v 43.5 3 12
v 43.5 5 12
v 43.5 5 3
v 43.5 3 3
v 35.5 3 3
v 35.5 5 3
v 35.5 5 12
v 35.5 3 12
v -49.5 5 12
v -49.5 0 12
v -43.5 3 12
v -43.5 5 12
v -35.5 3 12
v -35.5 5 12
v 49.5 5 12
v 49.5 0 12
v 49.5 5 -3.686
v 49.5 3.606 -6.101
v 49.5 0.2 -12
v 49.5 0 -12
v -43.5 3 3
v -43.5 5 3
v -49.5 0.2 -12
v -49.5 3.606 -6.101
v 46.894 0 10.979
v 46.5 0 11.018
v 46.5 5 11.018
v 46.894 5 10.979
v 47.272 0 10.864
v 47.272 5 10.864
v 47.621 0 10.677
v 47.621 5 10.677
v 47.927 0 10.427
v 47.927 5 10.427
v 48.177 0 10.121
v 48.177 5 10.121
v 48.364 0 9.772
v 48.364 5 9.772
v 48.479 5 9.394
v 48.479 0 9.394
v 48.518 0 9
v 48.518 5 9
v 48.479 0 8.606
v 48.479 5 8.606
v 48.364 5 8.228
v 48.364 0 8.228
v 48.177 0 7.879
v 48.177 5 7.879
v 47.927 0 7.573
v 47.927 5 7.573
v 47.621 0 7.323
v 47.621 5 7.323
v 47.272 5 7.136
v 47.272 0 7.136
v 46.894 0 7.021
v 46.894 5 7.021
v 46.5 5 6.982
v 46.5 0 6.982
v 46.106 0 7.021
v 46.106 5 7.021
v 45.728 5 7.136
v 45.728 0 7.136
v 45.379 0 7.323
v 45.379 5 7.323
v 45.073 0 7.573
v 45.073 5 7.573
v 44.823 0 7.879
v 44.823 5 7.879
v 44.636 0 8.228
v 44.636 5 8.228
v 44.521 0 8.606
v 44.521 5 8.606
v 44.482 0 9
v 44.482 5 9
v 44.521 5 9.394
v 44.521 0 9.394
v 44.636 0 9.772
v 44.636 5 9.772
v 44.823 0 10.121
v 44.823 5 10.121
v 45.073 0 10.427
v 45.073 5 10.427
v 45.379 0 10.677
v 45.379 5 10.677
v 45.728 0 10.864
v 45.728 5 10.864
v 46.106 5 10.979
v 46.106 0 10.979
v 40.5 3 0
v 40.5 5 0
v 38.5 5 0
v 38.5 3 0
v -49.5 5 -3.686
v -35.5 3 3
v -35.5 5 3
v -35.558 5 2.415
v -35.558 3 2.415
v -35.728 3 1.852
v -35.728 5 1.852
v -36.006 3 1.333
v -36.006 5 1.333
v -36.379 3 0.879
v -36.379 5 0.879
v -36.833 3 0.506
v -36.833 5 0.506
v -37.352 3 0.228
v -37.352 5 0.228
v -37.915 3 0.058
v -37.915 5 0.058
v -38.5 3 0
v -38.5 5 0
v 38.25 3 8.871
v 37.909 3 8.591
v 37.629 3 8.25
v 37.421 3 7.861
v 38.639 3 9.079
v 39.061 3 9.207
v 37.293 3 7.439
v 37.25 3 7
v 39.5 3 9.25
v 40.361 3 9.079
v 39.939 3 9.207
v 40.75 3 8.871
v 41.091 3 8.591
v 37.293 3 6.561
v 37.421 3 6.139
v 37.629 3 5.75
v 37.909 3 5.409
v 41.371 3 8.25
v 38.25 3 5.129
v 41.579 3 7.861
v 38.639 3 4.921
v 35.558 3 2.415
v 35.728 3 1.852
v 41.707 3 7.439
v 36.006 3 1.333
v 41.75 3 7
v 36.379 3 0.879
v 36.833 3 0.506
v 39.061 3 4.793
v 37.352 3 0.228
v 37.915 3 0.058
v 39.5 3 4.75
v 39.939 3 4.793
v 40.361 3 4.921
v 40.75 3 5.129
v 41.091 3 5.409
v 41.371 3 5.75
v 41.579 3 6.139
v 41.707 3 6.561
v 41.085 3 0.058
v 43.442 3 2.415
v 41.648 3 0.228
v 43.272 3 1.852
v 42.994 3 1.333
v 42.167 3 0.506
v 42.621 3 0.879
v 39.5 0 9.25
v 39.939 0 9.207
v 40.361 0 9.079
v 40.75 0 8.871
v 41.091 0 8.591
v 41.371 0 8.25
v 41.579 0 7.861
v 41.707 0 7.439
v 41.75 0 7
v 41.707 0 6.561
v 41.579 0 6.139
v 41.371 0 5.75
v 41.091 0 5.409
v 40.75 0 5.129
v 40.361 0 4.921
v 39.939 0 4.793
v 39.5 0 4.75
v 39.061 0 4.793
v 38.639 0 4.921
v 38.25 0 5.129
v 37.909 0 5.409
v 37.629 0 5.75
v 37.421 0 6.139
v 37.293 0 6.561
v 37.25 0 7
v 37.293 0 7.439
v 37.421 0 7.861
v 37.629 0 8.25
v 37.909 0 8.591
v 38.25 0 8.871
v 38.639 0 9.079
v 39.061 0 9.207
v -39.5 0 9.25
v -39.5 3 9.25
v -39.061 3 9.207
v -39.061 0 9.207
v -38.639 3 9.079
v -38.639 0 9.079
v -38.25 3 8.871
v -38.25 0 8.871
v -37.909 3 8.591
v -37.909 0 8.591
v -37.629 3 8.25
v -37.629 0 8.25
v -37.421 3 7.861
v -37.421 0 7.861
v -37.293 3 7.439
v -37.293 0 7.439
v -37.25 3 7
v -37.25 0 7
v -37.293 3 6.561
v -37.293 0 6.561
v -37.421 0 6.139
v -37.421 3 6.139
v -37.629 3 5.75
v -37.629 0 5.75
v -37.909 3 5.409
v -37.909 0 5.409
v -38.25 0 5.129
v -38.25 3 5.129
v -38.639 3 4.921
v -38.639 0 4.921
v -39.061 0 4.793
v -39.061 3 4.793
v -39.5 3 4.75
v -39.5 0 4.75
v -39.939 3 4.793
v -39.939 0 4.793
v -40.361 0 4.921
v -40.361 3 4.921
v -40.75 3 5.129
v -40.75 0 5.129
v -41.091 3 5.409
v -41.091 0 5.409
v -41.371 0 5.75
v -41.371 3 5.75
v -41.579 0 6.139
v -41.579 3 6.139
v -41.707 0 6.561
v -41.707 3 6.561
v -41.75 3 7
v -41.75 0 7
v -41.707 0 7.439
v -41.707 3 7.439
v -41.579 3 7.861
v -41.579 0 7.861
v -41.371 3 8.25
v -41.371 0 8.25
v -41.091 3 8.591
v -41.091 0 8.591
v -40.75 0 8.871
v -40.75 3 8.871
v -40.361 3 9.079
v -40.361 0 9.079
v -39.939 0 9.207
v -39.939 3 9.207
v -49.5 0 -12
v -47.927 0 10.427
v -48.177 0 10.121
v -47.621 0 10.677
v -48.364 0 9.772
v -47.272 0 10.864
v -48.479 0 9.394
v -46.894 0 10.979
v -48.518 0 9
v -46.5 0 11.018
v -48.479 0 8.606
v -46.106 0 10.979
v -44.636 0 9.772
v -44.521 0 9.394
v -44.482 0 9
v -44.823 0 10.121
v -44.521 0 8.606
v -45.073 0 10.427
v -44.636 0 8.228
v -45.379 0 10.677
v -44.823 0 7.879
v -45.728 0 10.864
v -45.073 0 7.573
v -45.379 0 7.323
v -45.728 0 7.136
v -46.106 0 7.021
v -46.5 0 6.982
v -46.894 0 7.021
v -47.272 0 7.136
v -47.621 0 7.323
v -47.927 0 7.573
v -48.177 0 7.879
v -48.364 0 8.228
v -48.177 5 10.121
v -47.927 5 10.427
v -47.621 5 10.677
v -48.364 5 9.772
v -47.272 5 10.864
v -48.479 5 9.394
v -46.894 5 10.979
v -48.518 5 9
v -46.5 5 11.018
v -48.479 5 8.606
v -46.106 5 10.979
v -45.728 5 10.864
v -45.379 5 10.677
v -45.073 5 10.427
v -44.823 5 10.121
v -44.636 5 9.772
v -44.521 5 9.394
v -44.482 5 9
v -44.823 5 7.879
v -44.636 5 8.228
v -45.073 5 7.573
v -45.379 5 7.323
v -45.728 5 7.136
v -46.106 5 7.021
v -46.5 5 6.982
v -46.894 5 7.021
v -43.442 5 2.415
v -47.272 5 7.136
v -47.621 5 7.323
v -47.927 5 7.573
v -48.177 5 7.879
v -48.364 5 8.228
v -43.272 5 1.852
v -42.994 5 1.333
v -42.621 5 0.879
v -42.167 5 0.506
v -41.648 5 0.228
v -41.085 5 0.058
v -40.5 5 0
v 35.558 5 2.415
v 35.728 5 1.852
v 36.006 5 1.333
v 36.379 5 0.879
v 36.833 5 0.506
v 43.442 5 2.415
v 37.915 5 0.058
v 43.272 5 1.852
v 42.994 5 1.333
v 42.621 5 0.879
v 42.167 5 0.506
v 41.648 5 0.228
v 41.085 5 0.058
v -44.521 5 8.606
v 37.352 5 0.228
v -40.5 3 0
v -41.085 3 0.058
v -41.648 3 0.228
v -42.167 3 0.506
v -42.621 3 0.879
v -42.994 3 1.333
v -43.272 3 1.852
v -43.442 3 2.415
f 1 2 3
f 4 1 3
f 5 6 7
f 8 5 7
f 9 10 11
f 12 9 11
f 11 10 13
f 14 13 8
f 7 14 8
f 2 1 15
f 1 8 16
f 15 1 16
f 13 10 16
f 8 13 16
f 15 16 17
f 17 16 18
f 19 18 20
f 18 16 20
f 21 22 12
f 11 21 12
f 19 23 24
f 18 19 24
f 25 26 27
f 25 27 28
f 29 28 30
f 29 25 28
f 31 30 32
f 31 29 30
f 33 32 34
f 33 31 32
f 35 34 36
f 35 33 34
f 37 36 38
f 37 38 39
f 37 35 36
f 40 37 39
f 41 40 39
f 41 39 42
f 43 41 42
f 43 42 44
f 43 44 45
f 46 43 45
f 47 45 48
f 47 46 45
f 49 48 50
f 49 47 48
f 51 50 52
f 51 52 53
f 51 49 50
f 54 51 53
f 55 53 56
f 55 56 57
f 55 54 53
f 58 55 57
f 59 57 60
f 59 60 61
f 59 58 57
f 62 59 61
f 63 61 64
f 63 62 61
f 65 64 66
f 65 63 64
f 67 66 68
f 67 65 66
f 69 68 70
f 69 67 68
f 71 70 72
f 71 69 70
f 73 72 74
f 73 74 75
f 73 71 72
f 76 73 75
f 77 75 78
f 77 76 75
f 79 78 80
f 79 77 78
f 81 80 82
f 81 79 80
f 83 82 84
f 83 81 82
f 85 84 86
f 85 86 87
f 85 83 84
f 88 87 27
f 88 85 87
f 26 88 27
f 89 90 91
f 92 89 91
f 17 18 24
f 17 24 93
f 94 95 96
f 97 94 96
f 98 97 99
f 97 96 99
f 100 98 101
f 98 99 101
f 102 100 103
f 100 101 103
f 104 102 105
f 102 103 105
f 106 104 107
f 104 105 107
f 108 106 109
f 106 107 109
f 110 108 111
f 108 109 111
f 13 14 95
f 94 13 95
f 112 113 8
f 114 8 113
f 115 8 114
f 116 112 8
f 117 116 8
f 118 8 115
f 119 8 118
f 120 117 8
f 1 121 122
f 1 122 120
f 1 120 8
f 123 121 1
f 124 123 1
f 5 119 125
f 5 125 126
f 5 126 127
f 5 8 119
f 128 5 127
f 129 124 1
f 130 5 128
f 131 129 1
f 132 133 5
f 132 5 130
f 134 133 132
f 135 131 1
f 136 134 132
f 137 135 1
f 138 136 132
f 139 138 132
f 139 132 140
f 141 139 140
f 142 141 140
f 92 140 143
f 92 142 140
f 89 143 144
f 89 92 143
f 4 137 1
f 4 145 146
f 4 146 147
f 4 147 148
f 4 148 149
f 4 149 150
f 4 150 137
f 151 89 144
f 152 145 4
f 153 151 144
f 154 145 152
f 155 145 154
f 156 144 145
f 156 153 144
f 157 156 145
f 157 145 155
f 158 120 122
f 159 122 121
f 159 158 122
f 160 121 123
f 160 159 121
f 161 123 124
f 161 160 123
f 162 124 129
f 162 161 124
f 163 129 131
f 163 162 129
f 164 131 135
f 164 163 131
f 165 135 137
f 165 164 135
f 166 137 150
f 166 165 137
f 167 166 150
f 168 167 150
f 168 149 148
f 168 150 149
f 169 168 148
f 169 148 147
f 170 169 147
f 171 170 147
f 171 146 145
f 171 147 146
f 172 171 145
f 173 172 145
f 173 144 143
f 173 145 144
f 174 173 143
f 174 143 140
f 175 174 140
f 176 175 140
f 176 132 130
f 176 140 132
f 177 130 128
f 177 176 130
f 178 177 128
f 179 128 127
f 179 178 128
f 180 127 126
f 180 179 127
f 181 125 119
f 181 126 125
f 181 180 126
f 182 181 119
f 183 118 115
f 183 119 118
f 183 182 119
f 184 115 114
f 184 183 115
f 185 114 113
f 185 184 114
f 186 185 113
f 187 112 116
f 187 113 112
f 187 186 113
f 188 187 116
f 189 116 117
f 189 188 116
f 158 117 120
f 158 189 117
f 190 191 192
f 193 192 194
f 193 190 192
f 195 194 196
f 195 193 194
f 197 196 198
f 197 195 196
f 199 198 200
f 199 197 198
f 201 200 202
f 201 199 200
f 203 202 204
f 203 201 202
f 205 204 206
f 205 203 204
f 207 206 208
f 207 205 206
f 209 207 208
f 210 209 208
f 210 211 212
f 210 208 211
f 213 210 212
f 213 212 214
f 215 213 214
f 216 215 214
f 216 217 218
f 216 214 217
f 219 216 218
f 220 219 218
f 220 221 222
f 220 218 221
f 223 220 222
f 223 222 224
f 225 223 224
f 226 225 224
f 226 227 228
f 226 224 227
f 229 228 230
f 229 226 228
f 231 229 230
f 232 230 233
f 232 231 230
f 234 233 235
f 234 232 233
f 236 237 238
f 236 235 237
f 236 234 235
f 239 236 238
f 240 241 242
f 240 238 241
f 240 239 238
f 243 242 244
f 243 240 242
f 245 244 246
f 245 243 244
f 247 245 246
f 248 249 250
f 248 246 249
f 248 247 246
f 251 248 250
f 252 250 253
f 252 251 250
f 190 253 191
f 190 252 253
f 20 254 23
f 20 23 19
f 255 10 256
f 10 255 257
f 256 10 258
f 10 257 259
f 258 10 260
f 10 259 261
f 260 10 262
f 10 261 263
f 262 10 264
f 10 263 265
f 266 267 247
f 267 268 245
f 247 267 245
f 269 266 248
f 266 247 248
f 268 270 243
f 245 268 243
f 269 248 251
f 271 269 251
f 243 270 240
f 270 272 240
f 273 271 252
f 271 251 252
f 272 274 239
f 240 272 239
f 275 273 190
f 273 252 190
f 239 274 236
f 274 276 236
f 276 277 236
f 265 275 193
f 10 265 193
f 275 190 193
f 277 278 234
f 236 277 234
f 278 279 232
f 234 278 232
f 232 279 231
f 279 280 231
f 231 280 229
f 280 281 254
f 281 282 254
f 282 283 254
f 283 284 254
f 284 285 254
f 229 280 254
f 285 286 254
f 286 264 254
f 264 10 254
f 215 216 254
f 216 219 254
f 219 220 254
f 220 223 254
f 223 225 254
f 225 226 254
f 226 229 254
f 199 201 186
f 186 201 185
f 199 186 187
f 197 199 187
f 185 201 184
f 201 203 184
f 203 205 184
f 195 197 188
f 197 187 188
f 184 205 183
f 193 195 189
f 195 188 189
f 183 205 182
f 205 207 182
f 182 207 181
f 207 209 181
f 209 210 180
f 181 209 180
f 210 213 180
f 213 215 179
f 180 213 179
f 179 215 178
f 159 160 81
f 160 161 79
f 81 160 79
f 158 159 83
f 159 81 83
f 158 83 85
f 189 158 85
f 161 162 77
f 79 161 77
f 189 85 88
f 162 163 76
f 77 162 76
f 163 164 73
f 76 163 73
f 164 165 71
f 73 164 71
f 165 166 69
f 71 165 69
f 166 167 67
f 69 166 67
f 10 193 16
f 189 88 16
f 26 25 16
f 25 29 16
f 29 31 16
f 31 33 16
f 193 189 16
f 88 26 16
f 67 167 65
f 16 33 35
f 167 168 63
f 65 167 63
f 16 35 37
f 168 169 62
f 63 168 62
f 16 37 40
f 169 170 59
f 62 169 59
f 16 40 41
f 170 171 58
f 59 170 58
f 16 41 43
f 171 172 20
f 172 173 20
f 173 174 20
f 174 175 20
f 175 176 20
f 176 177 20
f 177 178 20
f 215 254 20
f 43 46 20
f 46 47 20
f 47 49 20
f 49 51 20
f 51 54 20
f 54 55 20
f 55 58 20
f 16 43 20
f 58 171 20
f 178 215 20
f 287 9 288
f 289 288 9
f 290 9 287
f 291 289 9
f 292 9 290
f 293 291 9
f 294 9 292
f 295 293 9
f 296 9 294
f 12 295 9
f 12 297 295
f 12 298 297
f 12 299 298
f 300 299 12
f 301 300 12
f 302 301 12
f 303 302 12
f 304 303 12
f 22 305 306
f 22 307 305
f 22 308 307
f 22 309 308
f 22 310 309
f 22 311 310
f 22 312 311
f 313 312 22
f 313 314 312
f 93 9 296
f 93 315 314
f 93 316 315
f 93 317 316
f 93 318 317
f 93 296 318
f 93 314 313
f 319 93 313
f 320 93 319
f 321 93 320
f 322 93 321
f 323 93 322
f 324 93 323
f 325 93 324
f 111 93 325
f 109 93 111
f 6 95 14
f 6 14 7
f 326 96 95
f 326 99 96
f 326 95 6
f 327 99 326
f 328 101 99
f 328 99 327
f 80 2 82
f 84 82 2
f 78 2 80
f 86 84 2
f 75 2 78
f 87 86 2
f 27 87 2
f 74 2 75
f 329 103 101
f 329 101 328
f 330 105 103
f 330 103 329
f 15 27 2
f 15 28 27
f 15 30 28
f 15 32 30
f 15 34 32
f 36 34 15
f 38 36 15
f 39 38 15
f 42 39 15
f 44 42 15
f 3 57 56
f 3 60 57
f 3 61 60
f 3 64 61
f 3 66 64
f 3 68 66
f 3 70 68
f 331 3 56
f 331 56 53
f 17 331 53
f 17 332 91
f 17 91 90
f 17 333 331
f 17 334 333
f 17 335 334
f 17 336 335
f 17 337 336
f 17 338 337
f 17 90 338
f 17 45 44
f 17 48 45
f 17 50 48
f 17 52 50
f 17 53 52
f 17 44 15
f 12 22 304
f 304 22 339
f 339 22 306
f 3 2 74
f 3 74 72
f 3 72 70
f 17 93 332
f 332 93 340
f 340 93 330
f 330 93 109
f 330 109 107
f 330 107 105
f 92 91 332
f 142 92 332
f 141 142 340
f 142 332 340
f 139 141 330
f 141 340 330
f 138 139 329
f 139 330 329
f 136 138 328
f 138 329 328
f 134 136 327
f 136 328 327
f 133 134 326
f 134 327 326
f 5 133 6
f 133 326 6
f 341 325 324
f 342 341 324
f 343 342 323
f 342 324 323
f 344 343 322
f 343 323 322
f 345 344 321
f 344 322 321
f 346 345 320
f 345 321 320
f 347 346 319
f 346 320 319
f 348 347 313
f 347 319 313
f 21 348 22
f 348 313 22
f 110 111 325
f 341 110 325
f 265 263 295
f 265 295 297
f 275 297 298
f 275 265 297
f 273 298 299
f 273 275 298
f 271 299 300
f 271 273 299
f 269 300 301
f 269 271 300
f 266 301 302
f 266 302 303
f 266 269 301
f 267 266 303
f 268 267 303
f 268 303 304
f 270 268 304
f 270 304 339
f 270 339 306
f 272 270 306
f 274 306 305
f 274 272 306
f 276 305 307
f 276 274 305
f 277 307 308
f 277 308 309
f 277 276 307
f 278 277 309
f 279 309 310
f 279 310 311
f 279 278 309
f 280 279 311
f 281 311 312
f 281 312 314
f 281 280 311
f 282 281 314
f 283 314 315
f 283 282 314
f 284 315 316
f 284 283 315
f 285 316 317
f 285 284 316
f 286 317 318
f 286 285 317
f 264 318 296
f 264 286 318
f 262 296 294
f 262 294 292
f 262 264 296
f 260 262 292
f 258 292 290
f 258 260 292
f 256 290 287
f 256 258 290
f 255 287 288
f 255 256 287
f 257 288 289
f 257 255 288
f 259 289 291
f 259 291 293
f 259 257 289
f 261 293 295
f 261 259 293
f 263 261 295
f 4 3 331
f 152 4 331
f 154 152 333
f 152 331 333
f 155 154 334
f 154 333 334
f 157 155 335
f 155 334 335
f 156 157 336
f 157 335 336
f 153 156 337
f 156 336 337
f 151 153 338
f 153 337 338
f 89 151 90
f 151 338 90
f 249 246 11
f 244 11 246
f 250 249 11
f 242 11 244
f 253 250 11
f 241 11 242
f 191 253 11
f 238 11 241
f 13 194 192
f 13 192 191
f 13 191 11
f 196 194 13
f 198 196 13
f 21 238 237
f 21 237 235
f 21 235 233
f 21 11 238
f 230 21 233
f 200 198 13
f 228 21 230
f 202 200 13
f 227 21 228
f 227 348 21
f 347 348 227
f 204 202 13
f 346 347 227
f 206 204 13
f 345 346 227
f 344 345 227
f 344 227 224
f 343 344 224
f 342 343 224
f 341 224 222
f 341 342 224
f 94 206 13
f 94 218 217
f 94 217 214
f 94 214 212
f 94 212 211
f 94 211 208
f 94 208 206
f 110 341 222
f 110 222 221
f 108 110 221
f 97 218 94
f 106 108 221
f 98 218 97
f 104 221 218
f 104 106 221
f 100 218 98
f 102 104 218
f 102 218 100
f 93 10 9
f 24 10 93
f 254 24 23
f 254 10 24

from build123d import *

# Parameters (mm, degrees)
CROQUIS1_W              = 99
CROQUIS1_H              = 24
CROQUIS1_R              = 2.017504942
CROQUIS1_R_2            = 2.25
SALIENTE_EXTRUIR1_DEPTH = 5
CORTAR_EXTRUIR1_DEPTH   = 2
CORTAR_EXTRUIR5_DEPTH   = 141


with BuildPart() as part:
    # Croquis1 → Saliente-Extruir1 (new body)
    with BuildSketch(Plane(origin=(0, 0, 0), x_dir=(1, 0, 0), z_dir=(0, 1, 0))):
        Rectangle(CROQUIS1_W, CROQUIS1_H)
        with Locations(Location((-46.5, -9, 0), (0, 0, 270))):
            Circle(CROQUIS1_R, mode=Mode.SUBTRACT)
        with Locations(Location((-39.5, -7, 0), (0, 0, 270))):
            Circle(CROQUIS1_R_2, mode=Mode.SUBTRACT)
        with Locations(Location((39.5, -7, 0), (0, 0, 270))):
            Circle(CROQUIS1_R_2, mode=Mode.SUBTRACT)
        with Locations(Location((46.5, -9, 0), (0, 0, 270))):
            Circle(CROQUIS1_R, mode=Mode.SUBTRACT)
    extrude(amount=SALIENTE_EXTRUIR1_DEPTH)

    # Croquis2 → Cortar-Extruir1 (cut)
    with BuildSketch(Plane(origin=(0, 5, 0), x_dir=(1, 0, 0), z_dir=(0, 1, 0))):
        with BuildLine():
            Line((-43.5, -3), (-43.5, -12))
            Line((-43.5, -12), (-35.5, -12))
            Line((-35.5, -12), (-35.5, -3))
            ThreePointArc((-35.5, -3), (-36.378679656, -0.878679656), (-38.5, 0))
            Line((-38.5, 0), (-40.5, 0))
            ThreePointArc((-40.5, 0), (-42.621320344, -0.878679656), (-43.5, -3))
        make_face()
        with BuildLine():
            Line((40.5, 0), (38.5, 0))
            ThreePointArc((38.5, 0), (36.378679656, -0.878679656), (35.5, -3))
            Line((35.5, -3), (35.5, -12))
            Line((35.5, -12), (43.5, -12))
            Line((43.5, -12), (43.5, -3))
            ThreePointArc((43.5, -3), (42.621320344, -0.878679656), (40.5, 0))
        make_face()
    extrude(amount=-CORTAR_EXTRUIR1_DEPTH, mode=Mode.SUBTRACT)

    # Croquis3 → Cortar-Extruir5 (cut)
    with BuildSketch(Plane.ZY.offset(49.5)):
        Polygon((-12, 5), (-12, 0.2), (-6.100895765, 3.605849418), (-3.686156124, 5), align=None)
        Polygon((-12.757171087, 0.2), (-12, 0.2), (-12, 5), (-3.686156124, 5), (-3.039853353, 5.373143079), (-12.757171087, 5.373143079), align=None)
    extrude(amount=-CORTAR_EXTRUIR5_DEPTH, mode=Mode.SUBTRACT)


solid = part.part
